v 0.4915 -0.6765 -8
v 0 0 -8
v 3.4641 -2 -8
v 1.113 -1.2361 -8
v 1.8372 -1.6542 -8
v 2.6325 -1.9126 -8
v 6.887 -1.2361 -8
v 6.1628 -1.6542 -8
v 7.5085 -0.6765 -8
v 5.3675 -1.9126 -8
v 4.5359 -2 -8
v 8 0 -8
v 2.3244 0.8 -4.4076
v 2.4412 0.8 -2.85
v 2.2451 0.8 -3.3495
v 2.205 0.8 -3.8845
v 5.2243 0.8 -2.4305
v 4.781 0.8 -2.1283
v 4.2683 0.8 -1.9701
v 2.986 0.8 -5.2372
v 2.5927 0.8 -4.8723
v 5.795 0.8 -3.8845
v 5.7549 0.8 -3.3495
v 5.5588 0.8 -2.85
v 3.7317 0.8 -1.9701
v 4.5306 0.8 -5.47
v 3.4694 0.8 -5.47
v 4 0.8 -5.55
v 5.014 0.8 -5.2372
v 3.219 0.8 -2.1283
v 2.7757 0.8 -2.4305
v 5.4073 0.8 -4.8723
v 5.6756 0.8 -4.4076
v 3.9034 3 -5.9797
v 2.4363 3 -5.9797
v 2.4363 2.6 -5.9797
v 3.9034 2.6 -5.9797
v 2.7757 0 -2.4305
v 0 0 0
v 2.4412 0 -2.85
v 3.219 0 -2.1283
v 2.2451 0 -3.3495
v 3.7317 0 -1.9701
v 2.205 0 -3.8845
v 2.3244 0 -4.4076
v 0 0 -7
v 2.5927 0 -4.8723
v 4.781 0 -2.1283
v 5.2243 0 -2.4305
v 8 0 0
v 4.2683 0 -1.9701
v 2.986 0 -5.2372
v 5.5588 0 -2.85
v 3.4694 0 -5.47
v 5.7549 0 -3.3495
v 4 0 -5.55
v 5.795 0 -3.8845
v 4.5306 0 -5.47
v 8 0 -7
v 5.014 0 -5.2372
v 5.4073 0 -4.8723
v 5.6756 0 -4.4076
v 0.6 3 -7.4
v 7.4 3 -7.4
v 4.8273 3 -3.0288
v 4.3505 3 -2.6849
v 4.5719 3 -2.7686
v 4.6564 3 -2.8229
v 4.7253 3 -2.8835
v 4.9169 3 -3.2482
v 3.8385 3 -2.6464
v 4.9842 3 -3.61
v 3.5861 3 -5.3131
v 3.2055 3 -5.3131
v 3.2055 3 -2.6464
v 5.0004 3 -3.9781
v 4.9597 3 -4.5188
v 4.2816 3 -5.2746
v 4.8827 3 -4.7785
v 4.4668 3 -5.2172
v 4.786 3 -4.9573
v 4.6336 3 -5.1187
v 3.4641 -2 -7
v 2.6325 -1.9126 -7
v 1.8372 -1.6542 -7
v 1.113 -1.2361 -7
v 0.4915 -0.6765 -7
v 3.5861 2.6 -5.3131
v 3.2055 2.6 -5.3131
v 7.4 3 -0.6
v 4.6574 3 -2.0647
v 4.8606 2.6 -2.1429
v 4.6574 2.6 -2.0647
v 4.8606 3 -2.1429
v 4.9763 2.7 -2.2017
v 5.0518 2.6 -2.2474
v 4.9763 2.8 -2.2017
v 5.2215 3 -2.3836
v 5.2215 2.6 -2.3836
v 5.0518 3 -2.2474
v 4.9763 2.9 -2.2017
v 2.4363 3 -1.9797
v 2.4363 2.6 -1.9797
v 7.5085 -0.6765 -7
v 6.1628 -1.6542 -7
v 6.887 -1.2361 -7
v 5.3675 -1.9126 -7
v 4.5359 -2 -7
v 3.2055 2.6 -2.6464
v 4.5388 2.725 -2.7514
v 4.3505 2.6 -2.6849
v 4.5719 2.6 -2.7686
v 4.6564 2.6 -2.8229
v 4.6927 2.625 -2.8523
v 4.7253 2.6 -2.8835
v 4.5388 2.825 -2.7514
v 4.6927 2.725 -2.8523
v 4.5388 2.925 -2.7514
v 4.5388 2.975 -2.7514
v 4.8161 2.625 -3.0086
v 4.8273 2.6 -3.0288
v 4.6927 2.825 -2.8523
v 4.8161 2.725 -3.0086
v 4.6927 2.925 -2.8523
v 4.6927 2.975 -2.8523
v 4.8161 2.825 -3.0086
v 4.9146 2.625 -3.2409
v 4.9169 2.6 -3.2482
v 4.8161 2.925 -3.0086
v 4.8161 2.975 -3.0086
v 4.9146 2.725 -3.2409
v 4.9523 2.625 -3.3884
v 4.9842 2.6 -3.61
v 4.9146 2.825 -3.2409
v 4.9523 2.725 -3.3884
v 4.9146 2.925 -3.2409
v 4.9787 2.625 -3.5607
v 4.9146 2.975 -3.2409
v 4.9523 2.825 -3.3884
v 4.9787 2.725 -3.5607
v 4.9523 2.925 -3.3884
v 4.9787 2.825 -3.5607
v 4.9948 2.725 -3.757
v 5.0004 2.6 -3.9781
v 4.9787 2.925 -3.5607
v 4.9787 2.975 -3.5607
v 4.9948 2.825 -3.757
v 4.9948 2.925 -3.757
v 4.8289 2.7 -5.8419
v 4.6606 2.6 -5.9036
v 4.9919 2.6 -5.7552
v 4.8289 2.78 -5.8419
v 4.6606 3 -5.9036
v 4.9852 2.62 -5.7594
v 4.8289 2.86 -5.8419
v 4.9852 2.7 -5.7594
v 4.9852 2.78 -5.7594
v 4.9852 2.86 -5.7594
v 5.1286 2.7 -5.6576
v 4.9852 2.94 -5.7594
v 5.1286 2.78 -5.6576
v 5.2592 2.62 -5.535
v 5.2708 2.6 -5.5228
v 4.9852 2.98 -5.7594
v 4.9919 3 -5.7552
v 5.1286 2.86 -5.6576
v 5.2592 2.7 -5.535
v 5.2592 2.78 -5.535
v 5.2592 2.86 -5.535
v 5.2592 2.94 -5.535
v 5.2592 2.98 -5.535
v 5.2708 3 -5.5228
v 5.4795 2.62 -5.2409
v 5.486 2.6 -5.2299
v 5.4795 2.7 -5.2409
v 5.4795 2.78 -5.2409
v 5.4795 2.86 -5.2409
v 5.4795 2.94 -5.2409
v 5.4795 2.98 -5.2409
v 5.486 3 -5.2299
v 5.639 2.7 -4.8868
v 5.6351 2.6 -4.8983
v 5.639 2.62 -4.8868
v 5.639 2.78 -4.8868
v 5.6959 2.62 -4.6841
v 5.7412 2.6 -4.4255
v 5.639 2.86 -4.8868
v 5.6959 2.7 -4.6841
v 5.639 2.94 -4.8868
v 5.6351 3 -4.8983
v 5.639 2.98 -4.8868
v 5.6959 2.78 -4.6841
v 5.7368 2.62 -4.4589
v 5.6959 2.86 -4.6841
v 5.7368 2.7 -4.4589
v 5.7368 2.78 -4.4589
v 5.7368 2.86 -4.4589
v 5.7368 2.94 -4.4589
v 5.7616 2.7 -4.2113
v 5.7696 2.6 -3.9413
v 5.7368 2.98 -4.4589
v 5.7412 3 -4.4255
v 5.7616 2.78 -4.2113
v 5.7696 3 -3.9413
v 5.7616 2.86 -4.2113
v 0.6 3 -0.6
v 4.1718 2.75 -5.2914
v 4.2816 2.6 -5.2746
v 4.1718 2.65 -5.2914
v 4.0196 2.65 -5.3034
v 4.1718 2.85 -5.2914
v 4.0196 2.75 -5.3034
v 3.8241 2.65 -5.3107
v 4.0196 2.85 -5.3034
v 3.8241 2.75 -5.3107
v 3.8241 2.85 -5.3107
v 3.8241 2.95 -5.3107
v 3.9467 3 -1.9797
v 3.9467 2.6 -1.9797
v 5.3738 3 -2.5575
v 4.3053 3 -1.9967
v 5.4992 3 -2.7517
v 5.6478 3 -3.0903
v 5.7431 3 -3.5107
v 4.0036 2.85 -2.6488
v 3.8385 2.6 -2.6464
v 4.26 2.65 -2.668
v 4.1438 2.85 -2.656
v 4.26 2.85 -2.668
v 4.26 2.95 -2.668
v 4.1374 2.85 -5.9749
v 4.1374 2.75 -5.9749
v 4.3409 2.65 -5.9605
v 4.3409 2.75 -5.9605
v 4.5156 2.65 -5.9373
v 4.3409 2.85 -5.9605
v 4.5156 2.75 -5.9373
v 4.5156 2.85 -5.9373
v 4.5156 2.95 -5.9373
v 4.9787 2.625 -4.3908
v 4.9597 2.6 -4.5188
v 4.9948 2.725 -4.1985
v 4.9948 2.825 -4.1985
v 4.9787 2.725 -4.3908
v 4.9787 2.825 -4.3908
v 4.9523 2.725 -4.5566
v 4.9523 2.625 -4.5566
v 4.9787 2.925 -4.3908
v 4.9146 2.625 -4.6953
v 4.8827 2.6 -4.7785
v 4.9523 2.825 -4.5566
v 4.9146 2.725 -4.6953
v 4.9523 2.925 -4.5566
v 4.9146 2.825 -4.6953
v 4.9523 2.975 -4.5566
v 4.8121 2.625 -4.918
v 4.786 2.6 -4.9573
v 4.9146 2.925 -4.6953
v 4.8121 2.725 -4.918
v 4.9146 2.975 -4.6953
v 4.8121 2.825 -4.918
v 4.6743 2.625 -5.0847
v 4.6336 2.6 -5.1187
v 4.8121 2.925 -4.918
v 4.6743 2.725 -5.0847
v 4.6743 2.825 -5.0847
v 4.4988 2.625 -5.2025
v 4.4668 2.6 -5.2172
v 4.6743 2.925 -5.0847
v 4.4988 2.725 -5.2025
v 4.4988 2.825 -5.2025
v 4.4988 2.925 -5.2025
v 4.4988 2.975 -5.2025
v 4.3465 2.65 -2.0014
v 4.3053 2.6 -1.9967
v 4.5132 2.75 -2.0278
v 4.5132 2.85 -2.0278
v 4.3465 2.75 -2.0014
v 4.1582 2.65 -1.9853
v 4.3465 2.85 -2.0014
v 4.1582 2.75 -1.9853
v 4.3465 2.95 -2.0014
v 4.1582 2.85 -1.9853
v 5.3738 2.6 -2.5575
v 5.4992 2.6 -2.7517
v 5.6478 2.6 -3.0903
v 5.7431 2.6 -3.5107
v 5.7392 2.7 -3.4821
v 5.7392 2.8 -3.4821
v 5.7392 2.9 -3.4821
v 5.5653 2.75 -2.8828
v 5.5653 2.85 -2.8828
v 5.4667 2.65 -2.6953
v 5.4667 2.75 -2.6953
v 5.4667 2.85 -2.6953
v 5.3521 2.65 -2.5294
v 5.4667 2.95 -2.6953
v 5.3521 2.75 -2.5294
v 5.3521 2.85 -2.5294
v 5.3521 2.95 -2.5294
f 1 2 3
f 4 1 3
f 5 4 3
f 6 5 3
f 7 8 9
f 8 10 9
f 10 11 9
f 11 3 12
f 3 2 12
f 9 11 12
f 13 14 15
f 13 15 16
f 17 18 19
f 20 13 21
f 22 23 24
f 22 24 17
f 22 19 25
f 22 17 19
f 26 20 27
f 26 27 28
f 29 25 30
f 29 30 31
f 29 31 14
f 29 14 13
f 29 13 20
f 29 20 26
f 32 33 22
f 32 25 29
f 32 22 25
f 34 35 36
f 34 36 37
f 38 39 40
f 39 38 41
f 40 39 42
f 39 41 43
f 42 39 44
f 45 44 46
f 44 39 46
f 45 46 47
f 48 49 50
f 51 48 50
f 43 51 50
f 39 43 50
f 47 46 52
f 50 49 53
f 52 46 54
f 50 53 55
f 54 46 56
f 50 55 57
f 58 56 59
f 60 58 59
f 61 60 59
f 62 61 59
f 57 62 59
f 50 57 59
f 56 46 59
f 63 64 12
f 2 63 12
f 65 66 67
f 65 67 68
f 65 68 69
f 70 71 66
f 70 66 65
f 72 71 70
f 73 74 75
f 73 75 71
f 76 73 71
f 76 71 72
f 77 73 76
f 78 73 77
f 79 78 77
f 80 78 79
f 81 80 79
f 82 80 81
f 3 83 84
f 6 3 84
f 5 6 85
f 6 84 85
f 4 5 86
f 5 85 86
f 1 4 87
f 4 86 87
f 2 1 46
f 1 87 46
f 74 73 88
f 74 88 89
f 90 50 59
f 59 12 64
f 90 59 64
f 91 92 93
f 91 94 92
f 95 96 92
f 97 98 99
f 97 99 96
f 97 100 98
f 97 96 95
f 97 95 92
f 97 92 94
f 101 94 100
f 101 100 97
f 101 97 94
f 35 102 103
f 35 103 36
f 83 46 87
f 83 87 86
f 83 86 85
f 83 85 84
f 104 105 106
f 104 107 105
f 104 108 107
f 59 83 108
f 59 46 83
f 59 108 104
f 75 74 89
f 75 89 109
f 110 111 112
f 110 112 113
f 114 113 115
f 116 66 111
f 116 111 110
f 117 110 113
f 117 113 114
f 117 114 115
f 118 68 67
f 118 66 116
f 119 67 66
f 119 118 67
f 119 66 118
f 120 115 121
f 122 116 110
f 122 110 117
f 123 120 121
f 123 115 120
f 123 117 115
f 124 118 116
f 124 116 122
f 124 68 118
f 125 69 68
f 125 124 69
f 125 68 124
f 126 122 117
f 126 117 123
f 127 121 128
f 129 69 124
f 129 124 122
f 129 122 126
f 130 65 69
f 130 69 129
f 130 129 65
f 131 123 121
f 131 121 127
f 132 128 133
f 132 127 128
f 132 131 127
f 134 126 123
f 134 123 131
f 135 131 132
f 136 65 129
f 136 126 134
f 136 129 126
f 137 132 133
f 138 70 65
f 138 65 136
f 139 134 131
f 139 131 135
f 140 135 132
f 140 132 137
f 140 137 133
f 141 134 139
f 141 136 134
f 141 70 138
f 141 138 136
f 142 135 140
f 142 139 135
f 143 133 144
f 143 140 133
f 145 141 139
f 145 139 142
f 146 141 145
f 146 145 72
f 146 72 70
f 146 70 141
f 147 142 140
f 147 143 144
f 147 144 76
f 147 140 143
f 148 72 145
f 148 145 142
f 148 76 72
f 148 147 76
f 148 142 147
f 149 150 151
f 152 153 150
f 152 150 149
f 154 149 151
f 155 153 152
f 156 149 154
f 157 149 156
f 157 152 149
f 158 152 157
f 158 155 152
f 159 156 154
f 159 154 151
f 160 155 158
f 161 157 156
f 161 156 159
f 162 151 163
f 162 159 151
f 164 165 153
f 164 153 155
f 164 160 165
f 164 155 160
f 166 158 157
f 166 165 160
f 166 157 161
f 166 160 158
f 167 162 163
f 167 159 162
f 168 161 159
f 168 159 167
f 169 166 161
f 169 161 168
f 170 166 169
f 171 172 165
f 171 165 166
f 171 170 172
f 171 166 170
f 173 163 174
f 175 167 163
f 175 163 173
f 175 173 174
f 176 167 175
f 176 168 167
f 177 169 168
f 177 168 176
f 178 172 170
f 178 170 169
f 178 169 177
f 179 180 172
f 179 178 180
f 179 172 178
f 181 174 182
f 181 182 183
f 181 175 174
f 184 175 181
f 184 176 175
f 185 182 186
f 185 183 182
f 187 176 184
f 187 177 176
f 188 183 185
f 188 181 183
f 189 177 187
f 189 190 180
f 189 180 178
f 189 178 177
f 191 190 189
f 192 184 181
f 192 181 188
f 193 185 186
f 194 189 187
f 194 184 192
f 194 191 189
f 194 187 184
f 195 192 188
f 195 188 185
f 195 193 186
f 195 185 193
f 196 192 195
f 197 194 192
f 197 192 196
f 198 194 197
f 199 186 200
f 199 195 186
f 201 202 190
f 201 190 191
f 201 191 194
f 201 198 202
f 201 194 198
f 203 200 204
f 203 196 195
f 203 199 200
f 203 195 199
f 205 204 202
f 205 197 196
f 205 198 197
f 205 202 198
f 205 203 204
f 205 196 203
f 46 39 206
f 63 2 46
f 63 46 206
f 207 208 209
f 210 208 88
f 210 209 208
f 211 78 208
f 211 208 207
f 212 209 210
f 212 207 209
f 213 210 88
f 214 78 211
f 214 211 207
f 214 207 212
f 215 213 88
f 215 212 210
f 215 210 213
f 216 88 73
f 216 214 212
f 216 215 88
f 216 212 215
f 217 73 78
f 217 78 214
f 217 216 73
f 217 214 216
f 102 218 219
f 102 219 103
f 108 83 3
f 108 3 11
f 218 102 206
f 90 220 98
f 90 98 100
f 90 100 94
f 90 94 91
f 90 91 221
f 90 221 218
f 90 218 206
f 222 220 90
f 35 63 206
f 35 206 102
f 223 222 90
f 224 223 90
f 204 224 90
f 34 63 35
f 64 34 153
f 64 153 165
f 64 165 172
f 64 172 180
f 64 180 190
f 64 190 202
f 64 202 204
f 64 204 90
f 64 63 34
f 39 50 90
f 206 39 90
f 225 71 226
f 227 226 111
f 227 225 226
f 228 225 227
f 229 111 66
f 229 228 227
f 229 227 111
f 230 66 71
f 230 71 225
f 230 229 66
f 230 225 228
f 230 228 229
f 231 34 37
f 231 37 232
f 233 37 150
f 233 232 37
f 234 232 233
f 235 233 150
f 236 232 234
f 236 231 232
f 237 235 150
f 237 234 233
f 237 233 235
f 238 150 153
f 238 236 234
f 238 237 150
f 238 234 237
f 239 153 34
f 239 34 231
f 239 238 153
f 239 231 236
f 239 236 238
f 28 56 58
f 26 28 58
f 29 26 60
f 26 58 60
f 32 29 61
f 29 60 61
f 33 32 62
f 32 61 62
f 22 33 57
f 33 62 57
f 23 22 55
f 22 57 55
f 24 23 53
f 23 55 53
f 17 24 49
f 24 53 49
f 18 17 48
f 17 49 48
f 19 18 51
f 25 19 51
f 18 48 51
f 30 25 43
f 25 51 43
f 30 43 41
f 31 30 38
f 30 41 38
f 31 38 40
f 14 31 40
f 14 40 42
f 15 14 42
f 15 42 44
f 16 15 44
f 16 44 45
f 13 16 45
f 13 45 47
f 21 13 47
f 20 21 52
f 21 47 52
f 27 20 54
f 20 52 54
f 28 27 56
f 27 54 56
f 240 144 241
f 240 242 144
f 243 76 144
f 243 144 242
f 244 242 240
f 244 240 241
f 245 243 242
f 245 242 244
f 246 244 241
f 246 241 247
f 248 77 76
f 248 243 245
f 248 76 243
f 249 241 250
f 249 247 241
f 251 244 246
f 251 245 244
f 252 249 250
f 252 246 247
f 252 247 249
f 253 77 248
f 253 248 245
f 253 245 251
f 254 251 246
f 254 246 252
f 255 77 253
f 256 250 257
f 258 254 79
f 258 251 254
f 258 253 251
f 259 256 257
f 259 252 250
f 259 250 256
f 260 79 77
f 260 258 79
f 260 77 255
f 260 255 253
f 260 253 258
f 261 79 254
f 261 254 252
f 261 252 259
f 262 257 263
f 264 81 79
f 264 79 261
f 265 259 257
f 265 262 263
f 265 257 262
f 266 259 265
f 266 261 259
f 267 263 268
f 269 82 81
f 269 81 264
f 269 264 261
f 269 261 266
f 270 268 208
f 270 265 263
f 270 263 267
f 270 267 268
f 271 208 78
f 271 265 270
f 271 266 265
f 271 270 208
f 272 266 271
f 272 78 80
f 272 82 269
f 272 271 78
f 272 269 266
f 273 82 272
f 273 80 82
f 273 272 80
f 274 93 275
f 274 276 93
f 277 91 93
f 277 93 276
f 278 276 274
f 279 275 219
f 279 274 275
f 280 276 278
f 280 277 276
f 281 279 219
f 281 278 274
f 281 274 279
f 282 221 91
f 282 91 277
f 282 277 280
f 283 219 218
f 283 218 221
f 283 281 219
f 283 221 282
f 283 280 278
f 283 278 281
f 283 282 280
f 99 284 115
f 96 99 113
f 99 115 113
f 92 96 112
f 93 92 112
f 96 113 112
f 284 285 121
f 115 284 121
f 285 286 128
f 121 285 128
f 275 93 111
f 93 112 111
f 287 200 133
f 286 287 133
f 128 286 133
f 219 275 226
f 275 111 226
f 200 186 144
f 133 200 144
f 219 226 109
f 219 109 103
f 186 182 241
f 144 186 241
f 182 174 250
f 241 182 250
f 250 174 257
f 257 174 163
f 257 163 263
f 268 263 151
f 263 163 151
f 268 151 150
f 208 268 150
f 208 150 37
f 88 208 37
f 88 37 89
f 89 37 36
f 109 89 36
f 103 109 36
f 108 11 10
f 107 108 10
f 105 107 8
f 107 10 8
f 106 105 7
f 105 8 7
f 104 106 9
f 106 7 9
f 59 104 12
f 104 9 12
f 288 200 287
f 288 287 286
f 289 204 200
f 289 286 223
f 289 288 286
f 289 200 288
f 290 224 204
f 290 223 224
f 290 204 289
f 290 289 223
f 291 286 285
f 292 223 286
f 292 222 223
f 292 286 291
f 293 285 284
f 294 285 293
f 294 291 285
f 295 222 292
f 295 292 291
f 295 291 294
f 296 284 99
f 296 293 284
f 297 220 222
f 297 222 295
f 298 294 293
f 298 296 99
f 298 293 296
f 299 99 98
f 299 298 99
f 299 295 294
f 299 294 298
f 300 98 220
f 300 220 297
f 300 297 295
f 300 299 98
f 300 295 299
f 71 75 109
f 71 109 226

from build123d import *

# Parameters (mm, degrees)
SKETCH1_W               = 8
SKETCH1_H               = 8
BOSS_EXTRUDE1_DEPTH     = 3
CUT_EXTRUDE1_DEPTH      = 12.704699911
CUT_EXTRUDE1_DEPTH_BACK = 12.704699911
CUT_EXTRUDE2_DEPTH      = 11
SKETCH4_R               = 1.8
CUT_EXTRUDE3_DEPTH      = 0.8
SKETCH5_W               = 8
SKETCH5_H               = 1
BOSS_EXTRUDE2_DEPTH     = 2
FILLET1_R               = 4
CUT_EXTRUDE4_DEPTH      = 0.4


with BuildPart() as part:
    # Sketch1 → Boss-Extrude1 (new body)
    with BuildSketch(Plane(origin=(0, 0, 0), x_dir=(1, 0, 0), z_dir=(0, 1, 0))):
        with Locations((4, 4)):
            Rectangle(SKETCH1_W, SKETCH1_H)
    extrude(amount=BOSS_EXTRUDE1_DEPTH)

    # Sketch2 → Cut-Extrude1 (cut, two sides: drawn at the far end of the back side and taken through both)
    with BuildSketch(Plane.XY.offset(-CUT_EXTRUDE1_DEPTH_BACK)):
        Polygon((0, 0), (0.6, 3), (0, 3), align=None)
        Polygon((8, 0), (7.4, 3), (8, 3), align=None)
    extrude(amount=CUT_EXTRUDE1_DEPTH + CUT_EXTRUDE1_DEPTH_BACK, mode=Mode.SUBTRACT)

    # Sketch3 → Cut-Extrude2 (cut)
    with BuildSketch(Plane(origin=(0, 0, 0), x_dir=(0, 0, -1), z_dir=(1, 0, 0))):
        Polygon((0, 0), (0.6, 3), (0, 3), align=None)
        Polygon((8, 3), (7.4, 3), (8, 0), align=None)
    extrude(amount=CUT_EXTRUDE2_DEPTH, mode=Mode.SUBTRACT)

    # Sketch4 → Cut-Extrude3 (cut)
    with BuildSketch(Plane.XZ):
        with Locations(Location((4, -3.75, 0), (0, 0, 270))):
            Circle(SKETCH4_R)
    extrude(amount=-CUT_EXTRUDE3_DEPTH, mode=Mode.SUBTRACT)

    # Sketch5 → Boss-Extrude2 (add)
    with BuildSketch(Plane.XZ):
        with Locations((4, -7.5)):
            Rectangle(SKETCH5_W, SKETCH5_H)
    extrude(amount=BOSS_EXTRUDE2_DEPTH)

    # Fillet1
    # the kernel refuses this fillet: 4 mm, written as the material it takes off along each edge
    with BuildSketch(Plane(origin=(8, -2, -16.660254038), x_dir=(0, 1, 0), z_dir=(0, 0, 1)), Plane(origin=(0, -2, 1.660254038), x_dir=(0, 1, 0), z_dir=(0, 0, -1))) as fillet1_piece_1:
        with BuildLine():
            CenterArc((4, 3.464101615), FILLET1_R, 180, 60)
            Line((0, 3.464101615), (-0.08, 3.464101615))
            Line((-0.08, 3.464101615), (-0.08, 0))
            Line((-0.08, 0), (0, -0.08))
            ThreePointArc((0, -0.08), (1, -0.08), (1.96, -0.069282032))
            Line((1.96, -0.069282032), (2, 0))
        make_face()
    extrude(amount=18.320508076, mode=Mode.SUBTRACT)

    # Sketch6 → Cut-Extrude4 (cut)
    with BuildSketch(Plane(origin=(0, 3, 0), x_dir=(1, 0, 0), z_dir=(0, 1, 0))):
        with BuildLine():
            Line((2.436272881, 5.979723732), (3.903420317, 5.979723732))
            add(Edge.make_bspline(
                [(3.903420317, 5.979723732), (3.943490496, 5.979744505), (4.021516441, 5.979784954), (4.134752515, 5.975087302), (4.240642802, 5.970362082), (4.338883372, 5.960903224), (4.429815049, 5.950988663), (4.51360101, 5.938436084), (4.589711972, 5.922348579), (4.637707501, 5.909661658), (4.660631856, 5.903601937)],
                knots=[0, 0, 0, 0, 1.259756885, 2.453039283, 3.563158368, 4.591894114, 5.55549294, 6.43918076, 7.254497783, 8, 8, 8, 8], degree=3))
            add(Edge.make_bspline(
                [(4.660631856, 5.903601937), (4.689300162, 5.894258489), (4.74612039, 5.87573989), (4.829420592, 5.843292221), (4.908343197, 5.803050568), (4.985816138, 5.760749105), (5.058380803, 5.710732544), (5.129877456, 5.658697008), (5.195666079, 5.598419283), (5.281939397, 5.514177193), (5.380383811, 5.396825298), (5.483519335, 5.241163905), (5.570813292, 5.070304112), (5.630456537, 4.917219685), (5.670729972, 4.787084992), (5.697056277, 4.682749965), (5.719418871, 4.572846322), (5.737778631, 4.457346355), (5.752043635, 4.336250048), (5.762664083, 4.209589679), (5.767837312, 4.07725583), (5.769008616, 3.987205692), (5.769606215, 3.941262194)],
                knots=[0, 0, 0, 0, 0.745524535, 1.477620414, 2.207090574, 2.934465325, 3.657932502, 4.384347339, 5.118673636, 5.861150177, 7.365375624, 8.894729774, 10.468936425, 12.099947606, 12.950091786, 13.83580991, 14.759228729, 15.722225242, 16.726454549, 17.773376212, 18.863978586, 20, 20, 20, 20], degree=3))
            add(Edge.make_bspline(
                [(5.769606215, 3.941262194), (5.768515323, 3.861857727), (5.766405561, 3.708291084), (5.741963835, 3.486695058), (5.70674022, 3.280872561), (5.667035899, 3.152471539), (5.647811343, 3.090300655)],
                knots=[0, 0, 0, 0, 1.103207939, 2.133582005, 3.096293362, 4, 4, 4, 4], degree=3))
            add(Edge.make_bspline(
                [(5.647811343, 3.090300655), (5.635116766, 3.054625647), (5.610144552, 2.98444734), (5.566445051, 2.883214788), (5.519227431, 2.786877042), (5.468100041, 2.695510004), (5.412804571, 2.609524646), (5.353134197, 2.529178156), (5.290013855, 2.453412746), (5.244286819, 2.406778778), (5.221529292, 2.383569886)],
                knots=[0, 0, 0, 0, 1.090884612, 2.145940218, 3.175104604, 4.181306866, 5.161203701, 6.118658341, 7.063689906, 8, 8, 8, 8], degree=3))
            add(Edge.make_bspline(
                [(5.221529292, 2.383569886), (5.184702113, 2.350450915), (5.108759222, 2.282154876), (4.974934842, 2.197635799), (4.823675662, 2.122952418), (4.714264019, 2.084588805), (4.657426727, 2.06465963)],
                knots=[0, 0, 0, 0, 0.908140292, 1.872714733, 2.8949153, 4, 4, 4, 4], degree=3))
            add(Edge.make_bspline(
                [(4.657426727, 2.06465963), (4.634546833, 2.057632533), (4.587060796, 2.043048157), (4.511767003, 2.027471741), (4.431388989, 2.011061834), (4.344999886, 2.001176252), (4.253496453, 1.990751469), (4.156149493, 1.984898536), (4.053296456, 1.980743294), (3.98275208, 1.980068625), (3.946689548, 1.979723732)],
                knots=[0, 0, 0, 0, 0.799129865, 1.658552685, 2.566799617, 3.538529252, 4.561352959, 5.643373779, 6.795284424, 8, 8, 8, 8], degree=3))
            Line((3.946689548, 1.979723732), (2.436272881, 1.979723732))
            Line((2.436272881, 1.979723732), (2.436272881, 5.979723732))
        make_face()
        with BuildLine():
            Line((3.205503651, 5.313057065), (3.205503651, 2.646390399))
            Line((3.205503651, 2.646390399), (3.838516471, 2.646390399))
            add(Edge.make_bspline(
                [(3.838516471, 2.646390399), (3.86709534, 2.646617049), (3.922120581, 2.647053436), (4.001743514, 2.648335709), (4.07491632, 2.651807064), (4.142022322, 2.655402822), (4.202886818, 2.661343643), (4.257774639, 2.667186667), (4.306380252, 2.675360935), (4.336400272, 2.681813595), (4.350535702, 2.684851937)],
                knots=[0, 0, 0, 0, 1.333384787, 2.567275092, 3.714769766, 4.750907381, 5.701951617, 6.567520054, 7.325492842, 8, 8, 8, 8], degree=3))
            add(Edge.make_bspline(
                [(4.350535702, 2.684851937), (4.38364248, 2.693686468), (4.44812575, 2.710893803), (4.538666782, 2.749253907), (4.62059475, 2.795531175), (4.695281698, 2.8511776), (4.762590099, 2.92150181), (4.820046047, 3.011440962), (4.873220012, 3.118706088), (4.909633556, 3.221385639), (4.935771128, 3.313096613), (4.95346412, 3.390071897), (4.967446413, 3.47335137), (4.979473009, 3.562606359), (4.989190784, 3.657722085), (4.995237644, 3.759042029), (4.999364663, 3.866442163), (5.000032135, 3.940189623), (5.000375445, 3.978121168)],
                knots=[0, 0, 0, 0, 1.038686998, 2.023088296, 2.974059649, 3.888265163, 4.839857954, 5.909819677, 7.113156087, 8.466843969, 9.20827164, 10.006482943, 10.861893492, 11.769681931, 12.739021491, 13.762258324, 14.849031541, 16, 16, 16, 16], degree=3))
            add(Edge.make_bspline(
                [(5.000375445, 3.978121168), (5.000034775, 4.01605283), (4.999374834, 4.089533605), (4.995254144, 4.196132914), (4.989241251, 4.29585735), (4.979454269, 4.38883019), (4.967614104, 4.475179926), (4.953468032, 4.554979633), (4.935881696, 4.627705609), (4.909721893, 4.71410541), (4.870064977, 4.811221472), (4.816099655, 4.917402921), (4.749828382, 5.00790436), (4.676605078, 5.08652444), (4.592177372, 5.151224792), (4.498716105, 5.205415106), (4.394186359, 5.247475499), (4.319831067, 5.2653904), (4.281625445, 5.274595527)],
                knots=[0, 0, 0, 0, 1.117996097, 2.165769068, 3.143980016, 4.062055362, 4.920439205, 5.712587309, 6.449616741, 7.124491204, 8.371470382, 9.537068822, 10.625202851, 11.666538334, 12.693249444, 13.747832046, 14.842779399, 16, 16, 16, 16], degree=3))
            add(Edge.make_bspline(
                [(4.281625445, 5.274595527), (4.265088191, 5.27766838), (4.228679487, 5.284433627), (4.168262747, 5.292335475), (4.097380449, 5.298199321), (4.015671249, 5.304185793), (3.923465993, 5.307602683), (3.820378875, 5.311168762), (3.706841263, 5.312386928), (3.627511913, 5.312827267), (3.586112625, 5.313057065)],
                knots=[0, 0, 0, 0, 0.578738571, 1.274160813, 2.095454135, 3.025967819, 4.093109015, 5.270126069, 6.575371698, 8, 8, 8, 8], degree=3))
            Line((3.586112625, 5.313057065), (3.205503651, 5.313057065))
        make_face(mode=Mode.SUBTRACT)
    extrude(amount=-CUT_EXTRUDE4_DEPTH, mode=Mode.SUBTRACT)


solid = part.part
